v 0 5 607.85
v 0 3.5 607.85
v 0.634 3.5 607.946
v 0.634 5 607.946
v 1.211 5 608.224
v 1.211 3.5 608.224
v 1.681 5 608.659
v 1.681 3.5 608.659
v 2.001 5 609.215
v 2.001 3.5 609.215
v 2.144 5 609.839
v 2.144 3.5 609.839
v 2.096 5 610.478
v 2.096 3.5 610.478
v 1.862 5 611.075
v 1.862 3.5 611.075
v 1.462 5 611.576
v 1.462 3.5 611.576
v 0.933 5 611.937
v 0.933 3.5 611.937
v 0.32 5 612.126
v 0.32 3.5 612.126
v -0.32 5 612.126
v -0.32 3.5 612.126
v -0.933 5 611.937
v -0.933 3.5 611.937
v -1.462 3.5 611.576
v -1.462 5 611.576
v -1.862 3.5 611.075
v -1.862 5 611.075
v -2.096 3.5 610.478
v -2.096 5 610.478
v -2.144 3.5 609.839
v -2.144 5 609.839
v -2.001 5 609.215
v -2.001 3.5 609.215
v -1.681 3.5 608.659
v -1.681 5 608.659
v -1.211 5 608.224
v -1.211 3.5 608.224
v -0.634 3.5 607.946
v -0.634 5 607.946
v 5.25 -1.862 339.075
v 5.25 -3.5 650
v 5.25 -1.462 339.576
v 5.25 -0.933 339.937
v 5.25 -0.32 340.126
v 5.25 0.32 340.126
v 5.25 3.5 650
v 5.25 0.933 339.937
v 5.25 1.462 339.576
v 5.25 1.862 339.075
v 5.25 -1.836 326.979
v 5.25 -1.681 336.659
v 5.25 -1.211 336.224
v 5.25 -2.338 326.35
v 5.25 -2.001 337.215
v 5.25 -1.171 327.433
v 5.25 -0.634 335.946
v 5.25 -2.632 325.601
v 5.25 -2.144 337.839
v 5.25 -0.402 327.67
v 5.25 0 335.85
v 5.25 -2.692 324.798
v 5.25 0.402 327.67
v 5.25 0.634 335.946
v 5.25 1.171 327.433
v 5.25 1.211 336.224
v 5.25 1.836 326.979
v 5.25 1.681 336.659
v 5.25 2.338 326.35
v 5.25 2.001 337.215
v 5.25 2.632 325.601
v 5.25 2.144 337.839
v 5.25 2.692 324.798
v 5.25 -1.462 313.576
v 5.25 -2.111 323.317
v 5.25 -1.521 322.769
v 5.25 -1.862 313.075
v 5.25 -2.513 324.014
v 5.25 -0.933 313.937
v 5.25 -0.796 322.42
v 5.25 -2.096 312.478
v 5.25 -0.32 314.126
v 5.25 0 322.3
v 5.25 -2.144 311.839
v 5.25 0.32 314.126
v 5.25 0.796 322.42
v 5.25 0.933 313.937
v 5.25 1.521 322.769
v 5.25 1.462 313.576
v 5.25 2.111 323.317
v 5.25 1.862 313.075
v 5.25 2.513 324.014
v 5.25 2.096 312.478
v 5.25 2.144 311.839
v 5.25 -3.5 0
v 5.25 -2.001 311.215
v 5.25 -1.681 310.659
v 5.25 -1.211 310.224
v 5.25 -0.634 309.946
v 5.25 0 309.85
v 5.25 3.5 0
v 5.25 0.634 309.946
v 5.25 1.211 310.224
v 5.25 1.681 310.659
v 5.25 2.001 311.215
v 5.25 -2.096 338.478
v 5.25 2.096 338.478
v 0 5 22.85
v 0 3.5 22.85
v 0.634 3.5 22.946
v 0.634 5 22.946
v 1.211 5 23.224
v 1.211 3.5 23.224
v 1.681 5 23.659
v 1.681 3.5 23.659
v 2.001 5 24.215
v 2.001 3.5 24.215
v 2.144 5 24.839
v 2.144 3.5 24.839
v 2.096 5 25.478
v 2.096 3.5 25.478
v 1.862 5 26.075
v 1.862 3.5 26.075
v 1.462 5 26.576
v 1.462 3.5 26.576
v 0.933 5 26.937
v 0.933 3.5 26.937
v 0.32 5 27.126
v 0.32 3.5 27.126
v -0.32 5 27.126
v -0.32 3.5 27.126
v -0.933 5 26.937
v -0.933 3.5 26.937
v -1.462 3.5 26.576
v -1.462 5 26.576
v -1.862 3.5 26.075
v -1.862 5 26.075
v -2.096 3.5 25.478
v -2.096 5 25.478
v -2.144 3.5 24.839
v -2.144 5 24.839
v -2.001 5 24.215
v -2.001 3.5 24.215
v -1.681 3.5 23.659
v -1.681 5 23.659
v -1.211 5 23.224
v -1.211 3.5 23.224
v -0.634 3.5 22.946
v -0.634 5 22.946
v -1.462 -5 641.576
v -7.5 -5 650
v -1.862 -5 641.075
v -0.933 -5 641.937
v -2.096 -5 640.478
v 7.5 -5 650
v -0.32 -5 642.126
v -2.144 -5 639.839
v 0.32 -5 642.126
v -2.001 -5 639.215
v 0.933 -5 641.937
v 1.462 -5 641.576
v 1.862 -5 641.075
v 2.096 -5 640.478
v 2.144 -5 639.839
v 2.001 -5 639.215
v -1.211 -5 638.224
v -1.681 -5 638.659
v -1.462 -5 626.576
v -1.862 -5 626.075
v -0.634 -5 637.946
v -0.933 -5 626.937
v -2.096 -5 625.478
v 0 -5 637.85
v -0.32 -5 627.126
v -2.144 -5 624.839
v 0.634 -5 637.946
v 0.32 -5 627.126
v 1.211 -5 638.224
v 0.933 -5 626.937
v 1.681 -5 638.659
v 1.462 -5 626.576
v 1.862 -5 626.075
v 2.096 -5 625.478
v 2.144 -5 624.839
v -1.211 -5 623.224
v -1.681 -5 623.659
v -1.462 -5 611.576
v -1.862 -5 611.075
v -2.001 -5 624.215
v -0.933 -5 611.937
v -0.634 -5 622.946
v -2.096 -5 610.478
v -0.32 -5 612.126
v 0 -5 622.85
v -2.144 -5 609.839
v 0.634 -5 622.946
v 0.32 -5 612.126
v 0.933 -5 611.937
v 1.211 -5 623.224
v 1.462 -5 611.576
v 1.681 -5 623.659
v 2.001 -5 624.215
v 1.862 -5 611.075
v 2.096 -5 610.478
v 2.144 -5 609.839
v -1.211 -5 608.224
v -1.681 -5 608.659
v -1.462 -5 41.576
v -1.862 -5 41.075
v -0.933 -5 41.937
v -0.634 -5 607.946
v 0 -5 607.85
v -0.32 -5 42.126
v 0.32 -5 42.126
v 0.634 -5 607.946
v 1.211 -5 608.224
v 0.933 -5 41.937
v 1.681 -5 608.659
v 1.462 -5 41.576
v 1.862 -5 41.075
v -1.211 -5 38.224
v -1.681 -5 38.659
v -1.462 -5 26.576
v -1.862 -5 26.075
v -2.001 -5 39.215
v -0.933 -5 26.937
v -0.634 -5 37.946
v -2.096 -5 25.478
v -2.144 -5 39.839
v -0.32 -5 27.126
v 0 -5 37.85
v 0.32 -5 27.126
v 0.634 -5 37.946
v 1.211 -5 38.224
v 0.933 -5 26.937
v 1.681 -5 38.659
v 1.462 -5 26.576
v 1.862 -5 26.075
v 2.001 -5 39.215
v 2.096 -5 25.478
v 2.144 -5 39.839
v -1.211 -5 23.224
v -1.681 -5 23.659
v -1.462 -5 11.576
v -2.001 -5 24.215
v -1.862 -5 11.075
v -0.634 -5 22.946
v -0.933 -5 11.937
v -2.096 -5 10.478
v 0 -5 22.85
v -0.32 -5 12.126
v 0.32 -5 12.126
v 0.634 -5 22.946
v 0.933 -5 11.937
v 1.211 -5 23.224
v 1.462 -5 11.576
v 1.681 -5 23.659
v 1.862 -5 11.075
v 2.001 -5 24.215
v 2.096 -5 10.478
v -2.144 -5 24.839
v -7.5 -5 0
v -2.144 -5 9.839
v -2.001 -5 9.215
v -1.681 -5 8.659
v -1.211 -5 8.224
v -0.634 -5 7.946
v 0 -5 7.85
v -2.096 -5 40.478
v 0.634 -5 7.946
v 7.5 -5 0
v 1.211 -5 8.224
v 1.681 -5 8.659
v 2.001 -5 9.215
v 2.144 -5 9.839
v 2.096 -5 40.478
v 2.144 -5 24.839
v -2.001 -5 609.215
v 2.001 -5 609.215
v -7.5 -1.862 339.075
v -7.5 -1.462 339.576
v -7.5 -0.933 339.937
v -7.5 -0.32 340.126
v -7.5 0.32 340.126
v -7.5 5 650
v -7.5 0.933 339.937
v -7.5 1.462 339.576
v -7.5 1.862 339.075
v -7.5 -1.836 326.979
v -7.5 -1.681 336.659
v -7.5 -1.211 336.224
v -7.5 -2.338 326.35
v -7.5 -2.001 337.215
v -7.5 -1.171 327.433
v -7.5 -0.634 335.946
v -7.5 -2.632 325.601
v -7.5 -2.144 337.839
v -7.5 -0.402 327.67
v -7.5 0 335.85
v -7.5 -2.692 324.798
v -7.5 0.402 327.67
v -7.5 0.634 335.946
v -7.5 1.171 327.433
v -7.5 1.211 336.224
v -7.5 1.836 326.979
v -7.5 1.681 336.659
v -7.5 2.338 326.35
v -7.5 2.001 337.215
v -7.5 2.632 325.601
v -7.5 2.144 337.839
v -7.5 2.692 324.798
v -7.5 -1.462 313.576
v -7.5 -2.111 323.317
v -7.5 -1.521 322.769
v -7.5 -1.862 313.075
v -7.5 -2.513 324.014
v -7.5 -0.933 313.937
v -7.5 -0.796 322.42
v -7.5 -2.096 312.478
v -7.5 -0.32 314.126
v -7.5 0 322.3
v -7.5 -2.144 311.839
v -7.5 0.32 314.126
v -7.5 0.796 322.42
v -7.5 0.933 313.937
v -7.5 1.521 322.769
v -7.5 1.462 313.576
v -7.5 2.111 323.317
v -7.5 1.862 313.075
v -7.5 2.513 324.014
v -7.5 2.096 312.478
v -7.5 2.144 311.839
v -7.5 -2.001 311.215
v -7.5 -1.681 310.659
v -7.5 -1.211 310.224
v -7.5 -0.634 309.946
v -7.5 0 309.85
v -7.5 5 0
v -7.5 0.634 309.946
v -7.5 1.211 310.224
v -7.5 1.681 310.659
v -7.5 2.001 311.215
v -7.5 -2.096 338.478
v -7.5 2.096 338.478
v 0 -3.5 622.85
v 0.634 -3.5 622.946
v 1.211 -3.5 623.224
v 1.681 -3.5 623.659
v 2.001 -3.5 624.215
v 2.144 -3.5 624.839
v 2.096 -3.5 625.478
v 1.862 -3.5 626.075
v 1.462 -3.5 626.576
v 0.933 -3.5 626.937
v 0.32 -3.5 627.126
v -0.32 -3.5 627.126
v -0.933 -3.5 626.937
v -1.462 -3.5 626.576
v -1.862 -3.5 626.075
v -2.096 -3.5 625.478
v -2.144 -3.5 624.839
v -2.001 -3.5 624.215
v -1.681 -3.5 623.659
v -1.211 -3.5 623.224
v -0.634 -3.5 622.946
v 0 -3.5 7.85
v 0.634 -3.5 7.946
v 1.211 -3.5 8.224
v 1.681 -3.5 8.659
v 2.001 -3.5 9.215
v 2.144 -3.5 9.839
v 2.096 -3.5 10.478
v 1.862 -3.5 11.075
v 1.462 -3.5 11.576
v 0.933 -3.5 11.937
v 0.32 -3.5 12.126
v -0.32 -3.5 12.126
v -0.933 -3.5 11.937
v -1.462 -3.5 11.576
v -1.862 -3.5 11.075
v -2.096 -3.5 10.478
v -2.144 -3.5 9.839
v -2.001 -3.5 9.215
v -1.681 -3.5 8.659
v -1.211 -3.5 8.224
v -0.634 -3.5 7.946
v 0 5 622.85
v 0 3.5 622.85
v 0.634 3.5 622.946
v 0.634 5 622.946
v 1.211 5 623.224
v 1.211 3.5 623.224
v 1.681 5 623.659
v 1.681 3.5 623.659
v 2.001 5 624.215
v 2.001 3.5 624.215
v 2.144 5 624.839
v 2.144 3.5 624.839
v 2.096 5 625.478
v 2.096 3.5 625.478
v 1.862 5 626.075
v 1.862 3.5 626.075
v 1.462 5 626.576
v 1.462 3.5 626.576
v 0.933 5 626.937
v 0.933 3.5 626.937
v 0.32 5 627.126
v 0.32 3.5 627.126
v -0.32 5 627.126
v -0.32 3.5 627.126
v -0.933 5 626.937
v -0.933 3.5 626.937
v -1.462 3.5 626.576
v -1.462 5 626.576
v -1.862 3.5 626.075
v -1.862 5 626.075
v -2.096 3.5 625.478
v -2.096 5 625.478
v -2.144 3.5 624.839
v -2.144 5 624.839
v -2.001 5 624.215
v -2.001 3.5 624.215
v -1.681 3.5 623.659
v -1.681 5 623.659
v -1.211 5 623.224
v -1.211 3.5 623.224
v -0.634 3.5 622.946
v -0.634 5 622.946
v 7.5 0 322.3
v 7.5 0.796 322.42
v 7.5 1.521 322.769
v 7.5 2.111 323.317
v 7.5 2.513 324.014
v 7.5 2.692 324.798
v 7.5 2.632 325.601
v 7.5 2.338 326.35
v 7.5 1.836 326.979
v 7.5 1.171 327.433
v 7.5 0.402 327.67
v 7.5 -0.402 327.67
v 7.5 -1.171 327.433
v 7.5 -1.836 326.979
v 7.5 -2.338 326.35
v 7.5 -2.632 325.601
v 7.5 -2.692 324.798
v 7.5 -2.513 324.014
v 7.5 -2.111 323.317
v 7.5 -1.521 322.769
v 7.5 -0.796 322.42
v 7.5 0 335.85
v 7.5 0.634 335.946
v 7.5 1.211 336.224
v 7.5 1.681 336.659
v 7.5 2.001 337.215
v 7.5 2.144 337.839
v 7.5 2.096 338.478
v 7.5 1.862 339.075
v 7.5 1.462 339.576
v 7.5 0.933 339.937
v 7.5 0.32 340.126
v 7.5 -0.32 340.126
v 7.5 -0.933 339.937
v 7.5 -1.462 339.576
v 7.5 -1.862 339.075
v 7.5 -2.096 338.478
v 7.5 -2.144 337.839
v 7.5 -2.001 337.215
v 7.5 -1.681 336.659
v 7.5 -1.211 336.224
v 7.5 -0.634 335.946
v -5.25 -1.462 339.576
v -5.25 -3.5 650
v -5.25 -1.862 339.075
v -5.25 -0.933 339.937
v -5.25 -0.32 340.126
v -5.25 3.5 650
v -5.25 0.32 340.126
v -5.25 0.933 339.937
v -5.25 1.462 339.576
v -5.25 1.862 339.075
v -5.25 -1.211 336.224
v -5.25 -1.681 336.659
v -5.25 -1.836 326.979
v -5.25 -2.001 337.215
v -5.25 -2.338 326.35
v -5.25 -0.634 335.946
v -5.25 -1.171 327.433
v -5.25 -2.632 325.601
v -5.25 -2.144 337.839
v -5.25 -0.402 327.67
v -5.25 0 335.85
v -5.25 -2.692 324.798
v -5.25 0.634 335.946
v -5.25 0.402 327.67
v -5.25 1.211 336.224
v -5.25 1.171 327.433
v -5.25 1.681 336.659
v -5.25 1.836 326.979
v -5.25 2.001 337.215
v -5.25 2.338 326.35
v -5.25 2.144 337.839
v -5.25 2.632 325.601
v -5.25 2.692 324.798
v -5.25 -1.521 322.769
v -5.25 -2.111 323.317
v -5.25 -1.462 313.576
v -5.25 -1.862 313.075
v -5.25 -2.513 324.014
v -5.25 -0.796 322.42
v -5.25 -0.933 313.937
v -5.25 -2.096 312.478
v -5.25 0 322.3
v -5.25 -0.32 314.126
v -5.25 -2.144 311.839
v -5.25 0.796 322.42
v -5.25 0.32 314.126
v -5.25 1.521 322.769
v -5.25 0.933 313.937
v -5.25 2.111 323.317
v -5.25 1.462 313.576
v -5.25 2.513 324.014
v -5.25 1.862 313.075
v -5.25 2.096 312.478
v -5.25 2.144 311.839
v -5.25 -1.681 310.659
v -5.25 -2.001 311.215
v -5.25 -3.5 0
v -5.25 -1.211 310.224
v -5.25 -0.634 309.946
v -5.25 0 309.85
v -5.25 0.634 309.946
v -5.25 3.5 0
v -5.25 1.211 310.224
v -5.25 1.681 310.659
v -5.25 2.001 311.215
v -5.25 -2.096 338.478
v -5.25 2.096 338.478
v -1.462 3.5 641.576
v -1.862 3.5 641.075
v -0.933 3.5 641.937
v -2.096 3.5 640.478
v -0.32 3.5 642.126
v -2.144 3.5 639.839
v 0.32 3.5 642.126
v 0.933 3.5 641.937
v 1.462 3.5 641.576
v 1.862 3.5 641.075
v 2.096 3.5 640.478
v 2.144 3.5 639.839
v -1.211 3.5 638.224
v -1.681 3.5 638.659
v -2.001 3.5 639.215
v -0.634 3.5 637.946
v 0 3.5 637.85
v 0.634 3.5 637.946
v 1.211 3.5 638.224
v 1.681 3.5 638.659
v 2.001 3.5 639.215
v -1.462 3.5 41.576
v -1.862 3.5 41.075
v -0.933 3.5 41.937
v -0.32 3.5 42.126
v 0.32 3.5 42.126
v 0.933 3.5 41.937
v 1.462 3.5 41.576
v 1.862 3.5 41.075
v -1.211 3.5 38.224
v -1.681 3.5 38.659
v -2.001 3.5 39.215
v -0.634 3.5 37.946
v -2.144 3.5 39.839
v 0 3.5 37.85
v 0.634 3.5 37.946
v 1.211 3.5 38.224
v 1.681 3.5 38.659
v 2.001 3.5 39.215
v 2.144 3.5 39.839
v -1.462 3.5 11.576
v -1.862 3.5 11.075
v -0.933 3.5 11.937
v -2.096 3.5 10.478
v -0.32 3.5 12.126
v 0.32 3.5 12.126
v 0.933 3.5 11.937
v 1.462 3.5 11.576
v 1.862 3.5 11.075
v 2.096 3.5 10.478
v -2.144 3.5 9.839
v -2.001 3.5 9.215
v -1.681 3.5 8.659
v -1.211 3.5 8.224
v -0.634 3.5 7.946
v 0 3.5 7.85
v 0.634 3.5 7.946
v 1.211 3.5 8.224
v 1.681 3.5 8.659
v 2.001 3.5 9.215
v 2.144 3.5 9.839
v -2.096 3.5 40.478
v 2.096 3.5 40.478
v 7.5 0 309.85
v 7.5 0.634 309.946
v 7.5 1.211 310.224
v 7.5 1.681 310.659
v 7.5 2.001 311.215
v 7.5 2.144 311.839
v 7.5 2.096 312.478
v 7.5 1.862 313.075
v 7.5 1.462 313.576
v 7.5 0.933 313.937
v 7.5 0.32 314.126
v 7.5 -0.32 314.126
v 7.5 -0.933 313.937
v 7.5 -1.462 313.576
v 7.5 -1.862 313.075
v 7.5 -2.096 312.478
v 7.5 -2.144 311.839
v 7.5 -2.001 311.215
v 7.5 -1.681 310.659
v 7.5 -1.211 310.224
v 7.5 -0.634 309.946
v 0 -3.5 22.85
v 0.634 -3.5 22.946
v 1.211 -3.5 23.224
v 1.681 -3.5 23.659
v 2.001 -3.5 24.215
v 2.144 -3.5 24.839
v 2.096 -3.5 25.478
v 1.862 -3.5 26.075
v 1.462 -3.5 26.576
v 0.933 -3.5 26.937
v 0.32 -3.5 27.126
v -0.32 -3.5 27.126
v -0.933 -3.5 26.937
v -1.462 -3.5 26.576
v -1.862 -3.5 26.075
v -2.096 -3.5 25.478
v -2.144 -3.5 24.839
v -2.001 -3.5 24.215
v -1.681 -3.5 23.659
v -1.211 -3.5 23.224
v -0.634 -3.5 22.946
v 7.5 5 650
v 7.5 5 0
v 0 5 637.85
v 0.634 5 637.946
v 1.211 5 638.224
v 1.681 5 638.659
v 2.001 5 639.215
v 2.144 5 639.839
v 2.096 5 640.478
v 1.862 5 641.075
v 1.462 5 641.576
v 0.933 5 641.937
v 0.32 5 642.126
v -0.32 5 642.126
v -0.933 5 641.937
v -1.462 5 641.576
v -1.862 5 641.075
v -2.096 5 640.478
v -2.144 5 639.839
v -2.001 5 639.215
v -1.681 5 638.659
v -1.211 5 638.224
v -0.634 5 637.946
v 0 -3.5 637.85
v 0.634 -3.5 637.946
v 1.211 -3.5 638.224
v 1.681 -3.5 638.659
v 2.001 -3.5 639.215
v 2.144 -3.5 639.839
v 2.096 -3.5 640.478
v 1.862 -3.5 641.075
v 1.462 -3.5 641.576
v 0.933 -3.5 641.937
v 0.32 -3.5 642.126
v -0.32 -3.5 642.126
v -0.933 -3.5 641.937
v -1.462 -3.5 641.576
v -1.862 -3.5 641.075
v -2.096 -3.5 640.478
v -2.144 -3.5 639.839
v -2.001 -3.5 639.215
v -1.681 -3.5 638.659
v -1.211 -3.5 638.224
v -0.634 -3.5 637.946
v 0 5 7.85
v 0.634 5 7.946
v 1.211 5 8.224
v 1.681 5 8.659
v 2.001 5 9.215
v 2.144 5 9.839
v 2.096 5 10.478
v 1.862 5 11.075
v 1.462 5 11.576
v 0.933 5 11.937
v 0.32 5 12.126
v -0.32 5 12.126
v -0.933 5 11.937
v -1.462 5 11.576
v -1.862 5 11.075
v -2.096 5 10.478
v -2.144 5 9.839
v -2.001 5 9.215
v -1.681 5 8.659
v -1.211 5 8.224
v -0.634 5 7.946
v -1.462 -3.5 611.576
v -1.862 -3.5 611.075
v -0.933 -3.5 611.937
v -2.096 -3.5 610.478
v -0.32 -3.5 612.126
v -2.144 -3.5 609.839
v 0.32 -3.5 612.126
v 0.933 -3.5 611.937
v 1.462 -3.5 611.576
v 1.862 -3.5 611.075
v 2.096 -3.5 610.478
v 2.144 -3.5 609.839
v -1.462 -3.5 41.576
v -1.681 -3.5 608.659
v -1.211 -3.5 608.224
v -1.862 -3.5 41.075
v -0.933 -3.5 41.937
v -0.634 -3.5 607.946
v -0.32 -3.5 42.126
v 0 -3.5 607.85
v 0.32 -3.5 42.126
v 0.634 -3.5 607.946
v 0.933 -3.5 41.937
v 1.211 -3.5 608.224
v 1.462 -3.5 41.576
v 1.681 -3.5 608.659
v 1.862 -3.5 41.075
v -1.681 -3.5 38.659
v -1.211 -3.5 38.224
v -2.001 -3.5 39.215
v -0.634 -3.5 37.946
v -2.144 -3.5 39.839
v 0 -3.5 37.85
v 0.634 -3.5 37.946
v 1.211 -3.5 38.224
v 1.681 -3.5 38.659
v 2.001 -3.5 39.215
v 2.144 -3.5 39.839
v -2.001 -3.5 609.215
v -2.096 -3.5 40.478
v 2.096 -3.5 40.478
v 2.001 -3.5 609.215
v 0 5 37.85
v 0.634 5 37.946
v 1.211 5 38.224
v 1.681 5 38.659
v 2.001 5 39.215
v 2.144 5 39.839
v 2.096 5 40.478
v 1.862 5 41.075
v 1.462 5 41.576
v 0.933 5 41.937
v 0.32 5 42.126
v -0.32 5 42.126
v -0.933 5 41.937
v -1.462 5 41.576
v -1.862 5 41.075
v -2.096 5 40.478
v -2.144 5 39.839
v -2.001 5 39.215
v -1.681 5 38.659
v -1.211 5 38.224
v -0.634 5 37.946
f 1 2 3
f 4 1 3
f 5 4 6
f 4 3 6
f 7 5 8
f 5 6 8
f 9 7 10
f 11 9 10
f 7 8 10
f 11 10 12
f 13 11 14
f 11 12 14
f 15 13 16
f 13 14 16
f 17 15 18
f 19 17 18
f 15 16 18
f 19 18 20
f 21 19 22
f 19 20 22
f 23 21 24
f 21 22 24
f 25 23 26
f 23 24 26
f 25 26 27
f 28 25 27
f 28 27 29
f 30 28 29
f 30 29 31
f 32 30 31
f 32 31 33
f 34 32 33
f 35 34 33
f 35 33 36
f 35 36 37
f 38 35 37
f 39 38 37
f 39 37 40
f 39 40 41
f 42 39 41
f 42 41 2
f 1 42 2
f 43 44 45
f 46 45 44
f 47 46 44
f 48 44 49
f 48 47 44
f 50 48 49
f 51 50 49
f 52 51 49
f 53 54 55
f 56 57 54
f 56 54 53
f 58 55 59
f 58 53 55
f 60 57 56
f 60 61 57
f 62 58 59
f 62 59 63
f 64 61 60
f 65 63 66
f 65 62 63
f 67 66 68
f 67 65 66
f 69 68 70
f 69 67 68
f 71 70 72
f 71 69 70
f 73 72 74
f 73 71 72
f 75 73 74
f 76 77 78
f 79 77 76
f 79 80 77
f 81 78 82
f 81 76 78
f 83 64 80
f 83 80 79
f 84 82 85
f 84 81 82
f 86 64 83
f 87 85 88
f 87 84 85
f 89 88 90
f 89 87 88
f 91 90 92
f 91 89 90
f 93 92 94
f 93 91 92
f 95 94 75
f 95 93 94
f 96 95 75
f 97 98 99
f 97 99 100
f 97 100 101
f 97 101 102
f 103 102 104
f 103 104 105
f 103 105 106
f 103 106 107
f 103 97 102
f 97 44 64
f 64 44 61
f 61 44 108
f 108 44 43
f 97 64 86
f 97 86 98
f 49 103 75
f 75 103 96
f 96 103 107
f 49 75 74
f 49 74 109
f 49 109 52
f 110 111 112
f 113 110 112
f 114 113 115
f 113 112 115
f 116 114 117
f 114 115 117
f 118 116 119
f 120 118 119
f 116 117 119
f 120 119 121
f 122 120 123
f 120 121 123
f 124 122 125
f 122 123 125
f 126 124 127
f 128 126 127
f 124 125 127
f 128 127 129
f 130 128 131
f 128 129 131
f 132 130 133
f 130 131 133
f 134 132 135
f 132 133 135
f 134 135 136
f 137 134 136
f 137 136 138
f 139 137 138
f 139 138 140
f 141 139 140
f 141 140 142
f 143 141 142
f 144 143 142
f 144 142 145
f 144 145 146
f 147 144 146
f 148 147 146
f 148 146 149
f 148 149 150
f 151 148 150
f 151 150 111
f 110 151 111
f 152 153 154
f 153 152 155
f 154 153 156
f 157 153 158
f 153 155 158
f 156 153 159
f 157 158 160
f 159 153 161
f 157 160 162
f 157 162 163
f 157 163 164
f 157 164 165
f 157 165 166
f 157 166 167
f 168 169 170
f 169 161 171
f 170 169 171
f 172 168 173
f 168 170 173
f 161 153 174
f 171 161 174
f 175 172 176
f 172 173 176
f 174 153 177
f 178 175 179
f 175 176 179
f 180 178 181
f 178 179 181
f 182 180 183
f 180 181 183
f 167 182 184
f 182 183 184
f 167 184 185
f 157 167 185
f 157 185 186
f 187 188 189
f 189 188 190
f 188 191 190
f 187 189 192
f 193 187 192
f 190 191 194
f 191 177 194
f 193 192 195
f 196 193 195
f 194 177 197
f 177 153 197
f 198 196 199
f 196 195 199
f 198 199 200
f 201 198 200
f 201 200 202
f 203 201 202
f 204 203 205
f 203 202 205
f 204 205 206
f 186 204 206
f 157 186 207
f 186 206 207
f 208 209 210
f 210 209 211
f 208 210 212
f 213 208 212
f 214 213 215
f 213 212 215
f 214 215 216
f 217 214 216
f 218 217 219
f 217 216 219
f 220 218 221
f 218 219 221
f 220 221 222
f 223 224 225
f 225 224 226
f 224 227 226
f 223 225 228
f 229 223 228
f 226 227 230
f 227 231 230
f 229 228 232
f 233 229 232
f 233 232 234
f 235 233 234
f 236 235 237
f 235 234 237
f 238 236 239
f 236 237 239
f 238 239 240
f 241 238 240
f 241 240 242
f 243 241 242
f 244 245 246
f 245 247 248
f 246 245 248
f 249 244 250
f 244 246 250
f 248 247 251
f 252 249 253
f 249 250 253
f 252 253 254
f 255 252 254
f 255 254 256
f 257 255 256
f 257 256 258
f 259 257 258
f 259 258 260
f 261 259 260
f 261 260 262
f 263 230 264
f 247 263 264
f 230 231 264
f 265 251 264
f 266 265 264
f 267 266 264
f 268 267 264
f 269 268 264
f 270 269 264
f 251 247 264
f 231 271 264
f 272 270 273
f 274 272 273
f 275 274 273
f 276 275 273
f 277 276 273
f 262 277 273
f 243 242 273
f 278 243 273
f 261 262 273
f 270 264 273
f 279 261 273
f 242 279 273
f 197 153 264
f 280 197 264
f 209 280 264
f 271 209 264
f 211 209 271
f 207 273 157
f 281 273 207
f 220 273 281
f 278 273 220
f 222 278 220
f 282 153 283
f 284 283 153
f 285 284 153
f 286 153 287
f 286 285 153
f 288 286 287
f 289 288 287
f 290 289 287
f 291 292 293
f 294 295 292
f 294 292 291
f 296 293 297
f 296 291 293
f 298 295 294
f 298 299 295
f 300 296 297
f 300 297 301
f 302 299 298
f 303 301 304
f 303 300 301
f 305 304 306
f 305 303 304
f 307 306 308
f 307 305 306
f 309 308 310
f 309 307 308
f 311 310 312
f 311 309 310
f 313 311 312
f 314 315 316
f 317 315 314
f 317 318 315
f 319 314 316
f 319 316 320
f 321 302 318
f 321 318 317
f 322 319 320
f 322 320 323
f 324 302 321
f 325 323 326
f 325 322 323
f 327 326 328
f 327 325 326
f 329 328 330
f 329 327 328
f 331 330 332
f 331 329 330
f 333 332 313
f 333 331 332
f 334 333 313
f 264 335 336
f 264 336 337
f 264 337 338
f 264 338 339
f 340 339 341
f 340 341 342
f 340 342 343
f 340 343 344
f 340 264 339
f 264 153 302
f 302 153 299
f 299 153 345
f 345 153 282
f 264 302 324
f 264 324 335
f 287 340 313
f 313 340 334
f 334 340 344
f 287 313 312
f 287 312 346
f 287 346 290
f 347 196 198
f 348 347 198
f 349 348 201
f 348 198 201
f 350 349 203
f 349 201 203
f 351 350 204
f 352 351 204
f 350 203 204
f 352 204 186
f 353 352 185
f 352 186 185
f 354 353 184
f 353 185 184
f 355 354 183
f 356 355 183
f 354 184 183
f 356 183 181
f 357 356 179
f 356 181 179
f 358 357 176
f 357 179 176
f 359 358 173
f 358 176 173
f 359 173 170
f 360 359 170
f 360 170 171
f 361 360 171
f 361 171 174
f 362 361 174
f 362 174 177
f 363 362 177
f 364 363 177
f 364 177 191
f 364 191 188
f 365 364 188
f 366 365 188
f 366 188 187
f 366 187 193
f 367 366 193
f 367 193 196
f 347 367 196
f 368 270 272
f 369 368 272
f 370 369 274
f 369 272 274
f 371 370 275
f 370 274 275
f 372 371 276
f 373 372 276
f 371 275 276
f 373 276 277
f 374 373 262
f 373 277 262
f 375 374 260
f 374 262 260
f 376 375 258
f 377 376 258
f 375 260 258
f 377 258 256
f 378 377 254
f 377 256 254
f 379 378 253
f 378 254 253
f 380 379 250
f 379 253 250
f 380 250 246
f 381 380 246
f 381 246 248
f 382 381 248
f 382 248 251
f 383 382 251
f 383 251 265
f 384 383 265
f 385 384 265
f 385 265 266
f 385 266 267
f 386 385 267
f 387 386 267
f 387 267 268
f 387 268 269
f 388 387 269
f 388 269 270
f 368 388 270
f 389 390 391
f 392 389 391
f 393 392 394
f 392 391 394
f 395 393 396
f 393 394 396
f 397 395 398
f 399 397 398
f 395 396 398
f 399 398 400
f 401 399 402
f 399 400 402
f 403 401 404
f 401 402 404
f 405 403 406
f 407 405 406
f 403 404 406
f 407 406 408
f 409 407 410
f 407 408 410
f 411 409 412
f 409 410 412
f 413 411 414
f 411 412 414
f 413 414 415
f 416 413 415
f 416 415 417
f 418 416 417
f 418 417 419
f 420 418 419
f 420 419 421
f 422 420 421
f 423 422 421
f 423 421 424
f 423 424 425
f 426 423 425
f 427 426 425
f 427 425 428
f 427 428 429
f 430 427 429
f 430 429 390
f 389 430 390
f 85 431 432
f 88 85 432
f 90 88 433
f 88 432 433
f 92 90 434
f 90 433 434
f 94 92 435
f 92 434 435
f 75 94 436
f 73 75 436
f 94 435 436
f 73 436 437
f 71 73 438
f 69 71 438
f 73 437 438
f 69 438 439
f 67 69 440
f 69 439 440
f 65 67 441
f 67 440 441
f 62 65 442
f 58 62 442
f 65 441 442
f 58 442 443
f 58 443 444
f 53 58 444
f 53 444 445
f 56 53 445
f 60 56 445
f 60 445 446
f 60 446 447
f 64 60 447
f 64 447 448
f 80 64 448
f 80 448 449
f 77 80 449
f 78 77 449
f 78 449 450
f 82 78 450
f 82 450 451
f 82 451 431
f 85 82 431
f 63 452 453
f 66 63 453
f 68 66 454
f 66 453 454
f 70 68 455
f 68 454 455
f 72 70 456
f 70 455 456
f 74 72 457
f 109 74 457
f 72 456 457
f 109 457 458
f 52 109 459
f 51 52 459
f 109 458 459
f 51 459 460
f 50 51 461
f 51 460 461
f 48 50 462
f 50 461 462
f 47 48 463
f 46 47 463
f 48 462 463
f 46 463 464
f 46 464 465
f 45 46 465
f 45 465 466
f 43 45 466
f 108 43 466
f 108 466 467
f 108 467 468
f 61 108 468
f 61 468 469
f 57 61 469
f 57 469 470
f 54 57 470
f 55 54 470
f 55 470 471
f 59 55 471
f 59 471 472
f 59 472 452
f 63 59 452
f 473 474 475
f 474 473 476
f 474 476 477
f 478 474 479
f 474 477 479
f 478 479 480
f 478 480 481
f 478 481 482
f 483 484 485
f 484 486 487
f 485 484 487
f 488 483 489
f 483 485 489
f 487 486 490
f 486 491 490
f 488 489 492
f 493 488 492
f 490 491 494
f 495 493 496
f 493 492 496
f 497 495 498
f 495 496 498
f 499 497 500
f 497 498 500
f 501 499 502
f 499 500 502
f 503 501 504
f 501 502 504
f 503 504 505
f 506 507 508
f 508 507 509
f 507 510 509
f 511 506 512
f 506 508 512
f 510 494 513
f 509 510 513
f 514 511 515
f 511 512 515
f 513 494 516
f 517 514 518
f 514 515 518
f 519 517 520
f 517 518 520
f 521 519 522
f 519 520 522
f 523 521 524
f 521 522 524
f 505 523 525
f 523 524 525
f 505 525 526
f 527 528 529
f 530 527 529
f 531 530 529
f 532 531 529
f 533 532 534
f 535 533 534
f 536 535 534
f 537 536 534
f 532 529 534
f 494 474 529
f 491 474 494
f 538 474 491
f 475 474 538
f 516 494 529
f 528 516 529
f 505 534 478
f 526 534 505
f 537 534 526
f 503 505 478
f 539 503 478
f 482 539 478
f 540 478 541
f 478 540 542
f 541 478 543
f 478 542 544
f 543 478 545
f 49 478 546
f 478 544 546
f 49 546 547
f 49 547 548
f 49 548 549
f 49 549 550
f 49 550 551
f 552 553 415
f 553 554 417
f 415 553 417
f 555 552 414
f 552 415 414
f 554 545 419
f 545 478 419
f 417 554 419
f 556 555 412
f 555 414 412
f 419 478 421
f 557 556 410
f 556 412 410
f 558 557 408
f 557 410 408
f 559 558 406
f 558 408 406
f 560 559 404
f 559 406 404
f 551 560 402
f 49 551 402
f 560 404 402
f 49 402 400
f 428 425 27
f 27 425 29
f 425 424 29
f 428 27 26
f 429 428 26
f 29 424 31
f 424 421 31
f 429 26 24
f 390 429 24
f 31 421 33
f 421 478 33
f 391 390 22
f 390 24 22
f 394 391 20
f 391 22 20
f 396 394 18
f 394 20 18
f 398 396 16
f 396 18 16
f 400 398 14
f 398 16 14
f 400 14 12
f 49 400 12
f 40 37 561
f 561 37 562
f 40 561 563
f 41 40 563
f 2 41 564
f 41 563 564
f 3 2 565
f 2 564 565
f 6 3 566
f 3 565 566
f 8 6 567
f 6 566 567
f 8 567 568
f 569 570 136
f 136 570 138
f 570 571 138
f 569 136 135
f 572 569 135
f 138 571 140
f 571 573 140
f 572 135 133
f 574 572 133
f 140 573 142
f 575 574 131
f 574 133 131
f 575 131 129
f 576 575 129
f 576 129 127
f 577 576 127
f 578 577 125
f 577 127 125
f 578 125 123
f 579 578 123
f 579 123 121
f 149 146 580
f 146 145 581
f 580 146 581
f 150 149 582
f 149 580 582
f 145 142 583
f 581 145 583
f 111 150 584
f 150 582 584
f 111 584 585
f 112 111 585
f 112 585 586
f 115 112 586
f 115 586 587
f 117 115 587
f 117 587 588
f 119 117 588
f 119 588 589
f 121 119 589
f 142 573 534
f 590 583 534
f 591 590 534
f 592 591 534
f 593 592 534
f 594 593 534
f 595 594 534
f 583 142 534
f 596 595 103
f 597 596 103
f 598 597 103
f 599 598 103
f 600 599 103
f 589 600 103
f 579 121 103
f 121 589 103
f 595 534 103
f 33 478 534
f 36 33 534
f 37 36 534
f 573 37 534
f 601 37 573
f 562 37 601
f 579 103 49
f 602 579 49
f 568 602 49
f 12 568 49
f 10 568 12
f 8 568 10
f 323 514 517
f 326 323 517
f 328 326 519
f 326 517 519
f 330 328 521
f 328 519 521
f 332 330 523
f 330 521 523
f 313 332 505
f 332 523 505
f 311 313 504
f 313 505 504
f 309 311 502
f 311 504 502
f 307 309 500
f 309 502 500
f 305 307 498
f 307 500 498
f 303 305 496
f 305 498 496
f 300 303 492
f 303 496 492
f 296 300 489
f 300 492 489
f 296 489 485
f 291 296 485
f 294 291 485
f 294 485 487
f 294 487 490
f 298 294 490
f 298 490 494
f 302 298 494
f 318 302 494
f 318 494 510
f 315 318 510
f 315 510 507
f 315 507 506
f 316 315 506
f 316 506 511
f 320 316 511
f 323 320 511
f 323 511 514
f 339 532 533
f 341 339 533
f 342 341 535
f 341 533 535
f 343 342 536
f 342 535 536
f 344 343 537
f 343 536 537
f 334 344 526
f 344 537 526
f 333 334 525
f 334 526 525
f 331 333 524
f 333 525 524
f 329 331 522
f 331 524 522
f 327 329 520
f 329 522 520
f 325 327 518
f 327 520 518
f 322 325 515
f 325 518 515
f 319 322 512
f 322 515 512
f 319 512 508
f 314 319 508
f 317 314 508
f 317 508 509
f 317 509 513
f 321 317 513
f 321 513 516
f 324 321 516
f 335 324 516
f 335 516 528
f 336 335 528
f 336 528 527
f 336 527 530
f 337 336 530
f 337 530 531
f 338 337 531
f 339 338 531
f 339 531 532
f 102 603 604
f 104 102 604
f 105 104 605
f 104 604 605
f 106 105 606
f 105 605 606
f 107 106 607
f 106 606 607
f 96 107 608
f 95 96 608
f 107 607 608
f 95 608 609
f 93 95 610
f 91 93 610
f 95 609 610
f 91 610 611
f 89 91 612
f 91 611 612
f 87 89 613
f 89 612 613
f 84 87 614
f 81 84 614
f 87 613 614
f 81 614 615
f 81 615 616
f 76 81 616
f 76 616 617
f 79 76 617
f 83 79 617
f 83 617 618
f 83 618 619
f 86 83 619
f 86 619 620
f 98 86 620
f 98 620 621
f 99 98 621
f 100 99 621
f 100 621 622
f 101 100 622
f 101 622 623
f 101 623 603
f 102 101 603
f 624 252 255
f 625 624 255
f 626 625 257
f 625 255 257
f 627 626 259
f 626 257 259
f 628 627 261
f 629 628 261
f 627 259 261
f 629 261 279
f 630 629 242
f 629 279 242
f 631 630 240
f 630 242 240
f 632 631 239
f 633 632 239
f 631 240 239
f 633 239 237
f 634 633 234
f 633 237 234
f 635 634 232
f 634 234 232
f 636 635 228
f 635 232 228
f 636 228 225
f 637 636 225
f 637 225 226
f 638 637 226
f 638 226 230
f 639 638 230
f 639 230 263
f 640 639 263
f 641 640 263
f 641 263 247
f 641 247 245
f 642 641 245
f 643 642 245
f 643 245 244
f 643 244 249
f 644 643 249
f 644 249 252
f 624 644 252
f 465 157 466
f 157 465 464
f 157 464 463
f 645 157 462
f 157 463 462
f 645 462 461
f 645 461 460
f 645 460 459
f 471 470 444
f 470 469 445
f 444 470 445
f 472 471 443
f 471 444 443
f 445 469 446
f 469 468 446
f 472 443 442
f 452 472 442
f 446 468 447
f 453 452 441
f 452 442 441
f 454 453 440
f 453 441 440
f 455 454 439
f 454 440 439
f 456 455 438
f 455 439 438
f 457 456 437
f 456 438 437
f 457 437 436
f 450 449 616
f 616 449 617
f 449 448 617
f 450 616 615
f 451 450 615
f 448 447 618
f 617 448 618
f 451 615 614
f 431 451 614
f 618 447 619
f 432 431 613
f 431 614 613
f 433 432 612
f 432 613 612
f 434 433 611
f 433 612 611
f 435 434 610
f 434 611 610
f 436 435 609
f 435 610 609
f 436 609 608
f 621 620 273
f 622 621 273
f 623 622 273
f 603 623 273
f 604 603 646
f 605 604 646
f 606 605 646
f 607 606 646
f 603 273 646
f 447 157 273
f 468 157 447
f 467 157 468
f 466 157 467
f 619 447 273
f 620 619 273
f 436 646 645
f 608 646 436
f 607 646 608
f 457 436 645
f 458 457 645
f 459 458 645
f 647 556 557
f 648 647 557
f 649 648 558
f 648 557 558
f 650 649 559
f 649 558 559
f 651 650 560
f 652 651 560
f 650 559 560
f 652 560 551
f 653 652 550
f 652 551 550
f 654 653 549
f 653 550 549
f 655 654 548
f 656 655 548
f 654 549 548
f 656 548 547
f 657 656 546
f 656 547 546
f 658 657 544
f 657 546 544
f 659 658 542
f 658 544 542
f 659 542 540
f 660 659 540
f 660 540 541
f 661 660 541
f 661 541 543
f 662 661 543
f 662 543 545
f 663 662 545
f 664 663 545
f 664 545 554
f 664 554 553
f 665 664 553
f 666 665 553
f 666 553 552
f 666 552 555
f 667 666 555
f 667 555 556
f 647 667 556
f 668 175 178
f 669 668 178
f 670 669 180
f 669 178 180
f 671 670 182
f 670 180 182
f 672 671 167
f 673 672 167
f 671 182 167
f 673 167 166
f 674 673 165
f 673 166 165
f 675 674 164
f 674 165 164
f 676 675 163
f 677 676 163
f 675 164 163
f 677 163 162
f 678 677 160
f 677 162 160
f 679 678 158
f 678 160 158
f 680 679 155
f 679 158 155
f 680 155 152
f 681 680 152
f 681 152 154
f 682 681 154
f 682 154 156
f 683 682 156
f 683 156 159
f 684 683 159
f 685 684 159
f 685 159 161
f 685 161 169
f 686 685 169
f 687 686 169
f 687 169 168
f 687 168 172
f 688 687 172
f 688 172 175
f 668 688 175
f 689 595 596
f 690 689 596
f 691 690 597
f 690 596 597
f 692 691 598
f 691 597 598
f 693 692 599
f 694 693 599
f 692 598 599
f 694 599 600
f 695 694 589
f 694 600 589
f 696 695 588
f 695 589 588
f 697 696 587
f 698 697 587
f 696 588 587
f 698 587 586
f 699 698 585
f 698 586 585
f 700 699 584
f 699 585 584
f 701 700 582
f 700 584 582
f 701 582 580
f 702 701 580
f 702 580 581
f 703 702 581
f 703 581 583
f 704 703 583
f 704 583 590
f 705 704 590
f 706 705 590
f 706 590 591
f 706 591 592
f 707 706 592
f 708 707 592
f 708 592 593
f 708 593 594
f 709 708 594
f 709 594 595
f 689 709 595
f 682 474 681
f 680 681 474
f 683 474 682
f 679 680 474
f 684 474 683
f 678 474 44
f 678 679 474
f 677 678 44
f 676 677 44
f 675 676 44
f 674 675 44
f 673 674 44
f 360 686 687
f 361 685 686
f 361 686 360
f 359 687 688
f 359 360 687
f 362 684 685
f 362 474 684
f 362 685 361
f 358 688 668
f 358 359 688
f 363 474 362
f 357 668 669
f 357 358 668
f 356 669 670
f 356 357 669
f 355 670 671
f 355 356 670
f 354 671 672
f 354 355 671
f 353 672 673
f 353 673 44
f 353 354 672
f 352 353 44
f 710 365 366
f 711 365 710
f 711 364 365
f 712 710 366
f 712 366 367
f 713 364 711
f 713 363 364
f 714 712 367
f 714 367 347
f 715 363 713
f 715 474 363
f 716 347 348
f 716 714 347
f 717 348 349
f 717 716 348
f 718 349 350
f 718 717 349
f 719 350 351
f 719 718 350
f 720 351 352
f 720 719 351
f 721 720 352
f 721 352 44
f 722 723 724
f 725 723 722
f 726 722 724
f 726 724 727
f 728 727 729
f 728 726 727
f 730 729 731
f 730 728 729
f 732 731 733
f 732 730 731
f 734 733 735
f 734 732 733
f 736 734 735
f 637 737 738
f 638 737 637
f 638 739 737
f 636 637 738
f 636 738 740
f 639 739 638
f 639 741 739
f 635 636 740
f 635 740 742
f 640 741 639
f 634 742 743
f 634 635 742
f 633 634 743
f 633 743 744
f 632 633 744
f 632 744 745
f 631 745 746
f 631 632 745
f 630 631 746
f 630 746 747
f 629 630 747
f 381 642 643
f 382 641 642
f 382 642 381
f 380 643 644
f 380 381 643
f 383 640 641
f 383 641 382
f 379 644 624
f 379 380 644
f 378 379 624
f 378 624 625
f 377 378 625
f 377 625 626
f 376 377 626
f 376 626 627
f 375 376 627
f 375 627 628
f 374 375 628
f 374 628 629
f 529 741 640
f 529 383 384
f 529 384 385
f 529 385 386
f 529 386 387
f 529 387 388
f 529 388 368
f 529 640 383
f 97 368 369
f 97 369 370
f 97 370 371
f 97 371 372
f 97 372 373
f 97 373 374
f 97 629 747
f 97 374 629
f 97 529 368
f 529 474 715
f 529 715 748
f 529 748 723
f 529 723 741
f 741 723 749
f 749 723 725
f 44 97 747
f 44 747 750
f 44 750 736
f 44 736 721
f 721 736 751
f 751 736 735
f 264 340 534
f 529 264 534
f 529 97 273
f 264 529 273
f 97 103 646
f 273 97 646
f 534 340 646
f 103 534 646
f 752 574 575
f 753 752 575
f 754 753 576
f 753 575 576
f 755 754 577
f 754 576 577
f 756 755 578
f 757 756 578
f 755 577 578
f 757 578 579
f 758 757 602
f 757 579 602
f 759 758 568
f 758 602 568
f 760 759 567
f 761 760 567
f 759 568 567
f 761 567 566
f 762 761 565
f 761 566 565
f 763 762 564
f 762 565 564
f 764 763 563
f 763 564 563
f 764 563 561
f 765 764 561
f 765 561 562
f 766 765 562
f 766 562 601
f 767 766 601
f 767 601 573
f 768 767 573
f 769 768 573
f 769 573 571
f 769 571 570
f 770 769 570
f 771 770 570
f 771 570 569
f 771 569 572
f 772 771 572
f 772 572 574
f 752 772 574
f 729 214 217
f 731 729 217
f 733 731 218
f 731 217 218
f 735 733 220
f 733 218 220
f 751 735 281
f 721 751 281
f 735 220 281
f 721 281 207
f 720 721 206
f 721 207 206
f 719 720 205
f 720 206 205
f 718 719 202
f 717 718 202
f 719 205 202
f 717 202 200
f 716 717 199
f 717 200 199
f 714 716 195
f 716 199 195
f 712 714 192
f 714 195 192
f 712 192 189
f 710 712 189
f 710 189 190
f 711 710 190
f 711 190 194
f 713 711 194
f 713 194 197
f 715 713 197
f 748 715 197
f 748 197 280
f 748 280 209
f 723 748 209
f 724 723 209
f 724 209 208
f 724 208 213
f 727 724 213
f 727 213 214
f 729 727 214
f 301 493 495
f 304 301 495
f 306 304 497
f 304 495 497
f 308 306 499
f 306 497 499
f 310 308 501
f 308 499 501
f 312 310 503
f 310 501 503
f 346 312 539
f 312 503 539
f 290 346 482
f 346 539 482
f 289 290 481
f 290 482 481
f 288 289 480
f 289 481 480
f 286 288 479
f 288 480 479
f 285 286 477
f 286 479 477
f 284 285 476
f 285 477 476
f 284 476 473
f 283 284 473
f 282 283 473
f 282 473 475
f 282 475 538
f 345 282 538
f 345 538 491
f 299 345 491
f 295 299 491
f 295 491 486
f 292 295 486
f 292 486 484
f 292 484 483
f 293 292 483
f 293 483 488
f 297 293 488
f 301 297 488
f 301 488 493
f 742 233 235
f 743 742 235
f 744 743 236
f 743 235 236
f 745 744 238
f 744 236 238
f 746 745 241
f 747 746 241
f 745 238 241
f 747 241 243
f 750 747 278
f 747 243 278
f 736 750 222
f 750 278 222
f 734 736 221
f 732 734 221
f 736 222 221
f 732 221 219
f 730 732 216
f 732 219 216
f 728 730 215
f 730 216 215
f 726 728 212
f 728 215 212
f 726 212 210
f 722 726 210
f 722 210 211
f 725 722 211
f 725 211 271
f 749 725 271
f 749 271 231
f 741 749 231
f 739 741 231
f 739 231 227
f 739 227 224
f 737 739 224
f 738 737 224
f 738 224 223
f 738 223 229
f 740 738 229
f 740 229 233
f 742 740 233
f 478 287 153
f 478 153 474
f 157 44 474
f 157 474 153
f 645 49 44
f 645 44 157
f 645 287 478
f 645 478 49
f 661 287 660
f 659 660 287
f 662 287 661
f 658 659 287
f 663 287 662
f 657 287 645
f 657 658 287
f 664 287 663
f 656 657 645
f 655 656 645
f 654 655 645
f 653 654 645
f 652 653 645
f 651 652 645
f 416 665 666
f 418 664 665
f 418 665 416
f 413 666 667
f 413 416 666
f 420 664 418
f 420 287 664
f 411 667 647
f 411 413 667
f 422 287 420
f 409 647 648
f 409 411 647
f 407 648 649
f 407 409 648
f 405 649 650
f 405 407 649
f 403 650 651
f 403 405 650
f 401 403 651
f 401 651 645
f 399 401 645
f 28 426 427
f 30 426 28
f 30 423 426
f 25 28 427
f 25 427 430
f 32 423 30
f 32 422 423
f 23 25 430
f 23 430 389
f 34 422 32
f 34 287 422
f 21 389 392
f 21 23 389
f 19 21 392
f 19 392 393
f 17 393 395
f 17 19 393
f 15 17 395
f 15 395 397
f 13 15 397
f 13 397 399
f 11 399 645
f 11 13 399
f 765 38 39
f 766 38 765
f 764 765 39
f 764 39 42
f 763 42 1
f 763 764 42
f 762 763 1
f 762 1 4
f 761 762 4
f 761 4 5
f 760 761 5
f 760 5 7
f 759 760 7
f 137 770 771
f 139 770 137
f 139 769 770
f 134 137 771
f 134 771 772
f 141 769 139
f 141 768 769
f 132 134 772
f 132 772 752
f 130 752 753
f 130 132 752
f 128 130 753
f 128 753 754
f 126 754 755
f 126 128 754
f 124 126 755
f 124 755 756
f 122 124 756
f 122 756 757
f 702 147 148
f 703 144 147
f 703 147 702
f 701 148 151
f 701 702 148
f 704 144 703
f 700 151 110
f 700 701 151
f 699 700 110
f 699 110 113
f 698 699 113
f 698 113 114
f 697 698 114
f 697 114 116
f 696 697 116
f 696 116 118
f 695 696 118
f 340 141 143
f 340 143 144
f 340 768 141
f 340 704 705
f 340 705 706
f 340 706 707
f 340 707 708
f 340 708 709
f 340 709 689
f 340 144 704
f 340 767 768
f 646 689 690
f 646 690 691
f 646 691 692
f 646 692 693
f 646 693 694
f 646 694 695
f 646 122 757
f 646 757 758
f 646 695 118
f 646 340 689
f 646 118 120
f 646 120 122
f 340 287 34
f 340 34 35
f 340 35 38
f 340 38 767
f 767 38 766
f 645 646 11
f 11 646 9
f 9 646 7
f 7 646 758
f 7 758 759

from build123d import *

# Parameters (mm, degrees)
SKETCH_1_W          = 15
SKETCH_1_H          = 10
SKETCH_1_W_2        = 10.5
SKETCH_1_H_2        = 7
EXTRUDE_1_DEPTH     = 650
SKETCH_2_R          = 2.15
CUT_EXTRUDE_1_DEPTH = 651.120181197
SKETCH_3_R          = 2.15
SKETCH_3_R_2        = 2.7
CUT_EXTRUDE_2_DEPTH = 651.192279253


with BuildPart() as part:
    # 草图1 → 凸台-拉伸1 (new body)
    with BuildSketch(Plane.XY):
        Rectangle(SKETCH_1_W, SKETCH_1_H)
        Rectangle(SKETCH_1_W_2, SKETCH_1_H_2, mode=Mode.SUBTRACT)
    extrude(amount=EXTRUDE_1_DEPTH)

    # 草图2 → 切除-拉伸1 (cut, through all)
    with BuildSketch(Plane.XZ.offset(5)):
        with Locations(Location((0, 640, 0), (0, 0, 270))):
            Circle(SKETCH_2_R)
        with Locations(Location((0, 625, 0), (0, 0, 270))):
            Circle(SKETCH_2_R)
        with Locations(Location((0, 610, 0), (0, 0, 270))):
            Circle(SKETCH_2_R)
        with Locations(Location((0, 10, 0), (0, 0, 270))):
            Circle(SKETCH_2_R)
        with Locations(Location((0, 25, 0), (0, 0, 270))):
            Circle(SKETCH_2_R)
        with Locations(Location((0, 40, 0), (0, 0, 270))):
            Circle(SKETCH_2_R)
    extrude(amount=-CUT_EXTRUDE_1_DEPTH, mode=Mode.SUBTRACT)

    # 草图3 → 切除-拉伸2 (cut, through all)
    with BuildSketch(Plane(origin=(7.5, 0, 0), x_dir=(0, 0, -1), z_dir=(1, 0, 0))):
        with Locations((-338, 0)):
            Circle(SKETCH_3_R)
        with Locations((-312, 0)):
            Circle(SKETCH_3_R)
        with Locations((-325, 0)):
            Circle(SKETCH_3_R_2)
    extrude(amount=-CUT_EXTRUDE_2_DEPTH, mode=Mode.SUBTRACT)


solid = part.part
